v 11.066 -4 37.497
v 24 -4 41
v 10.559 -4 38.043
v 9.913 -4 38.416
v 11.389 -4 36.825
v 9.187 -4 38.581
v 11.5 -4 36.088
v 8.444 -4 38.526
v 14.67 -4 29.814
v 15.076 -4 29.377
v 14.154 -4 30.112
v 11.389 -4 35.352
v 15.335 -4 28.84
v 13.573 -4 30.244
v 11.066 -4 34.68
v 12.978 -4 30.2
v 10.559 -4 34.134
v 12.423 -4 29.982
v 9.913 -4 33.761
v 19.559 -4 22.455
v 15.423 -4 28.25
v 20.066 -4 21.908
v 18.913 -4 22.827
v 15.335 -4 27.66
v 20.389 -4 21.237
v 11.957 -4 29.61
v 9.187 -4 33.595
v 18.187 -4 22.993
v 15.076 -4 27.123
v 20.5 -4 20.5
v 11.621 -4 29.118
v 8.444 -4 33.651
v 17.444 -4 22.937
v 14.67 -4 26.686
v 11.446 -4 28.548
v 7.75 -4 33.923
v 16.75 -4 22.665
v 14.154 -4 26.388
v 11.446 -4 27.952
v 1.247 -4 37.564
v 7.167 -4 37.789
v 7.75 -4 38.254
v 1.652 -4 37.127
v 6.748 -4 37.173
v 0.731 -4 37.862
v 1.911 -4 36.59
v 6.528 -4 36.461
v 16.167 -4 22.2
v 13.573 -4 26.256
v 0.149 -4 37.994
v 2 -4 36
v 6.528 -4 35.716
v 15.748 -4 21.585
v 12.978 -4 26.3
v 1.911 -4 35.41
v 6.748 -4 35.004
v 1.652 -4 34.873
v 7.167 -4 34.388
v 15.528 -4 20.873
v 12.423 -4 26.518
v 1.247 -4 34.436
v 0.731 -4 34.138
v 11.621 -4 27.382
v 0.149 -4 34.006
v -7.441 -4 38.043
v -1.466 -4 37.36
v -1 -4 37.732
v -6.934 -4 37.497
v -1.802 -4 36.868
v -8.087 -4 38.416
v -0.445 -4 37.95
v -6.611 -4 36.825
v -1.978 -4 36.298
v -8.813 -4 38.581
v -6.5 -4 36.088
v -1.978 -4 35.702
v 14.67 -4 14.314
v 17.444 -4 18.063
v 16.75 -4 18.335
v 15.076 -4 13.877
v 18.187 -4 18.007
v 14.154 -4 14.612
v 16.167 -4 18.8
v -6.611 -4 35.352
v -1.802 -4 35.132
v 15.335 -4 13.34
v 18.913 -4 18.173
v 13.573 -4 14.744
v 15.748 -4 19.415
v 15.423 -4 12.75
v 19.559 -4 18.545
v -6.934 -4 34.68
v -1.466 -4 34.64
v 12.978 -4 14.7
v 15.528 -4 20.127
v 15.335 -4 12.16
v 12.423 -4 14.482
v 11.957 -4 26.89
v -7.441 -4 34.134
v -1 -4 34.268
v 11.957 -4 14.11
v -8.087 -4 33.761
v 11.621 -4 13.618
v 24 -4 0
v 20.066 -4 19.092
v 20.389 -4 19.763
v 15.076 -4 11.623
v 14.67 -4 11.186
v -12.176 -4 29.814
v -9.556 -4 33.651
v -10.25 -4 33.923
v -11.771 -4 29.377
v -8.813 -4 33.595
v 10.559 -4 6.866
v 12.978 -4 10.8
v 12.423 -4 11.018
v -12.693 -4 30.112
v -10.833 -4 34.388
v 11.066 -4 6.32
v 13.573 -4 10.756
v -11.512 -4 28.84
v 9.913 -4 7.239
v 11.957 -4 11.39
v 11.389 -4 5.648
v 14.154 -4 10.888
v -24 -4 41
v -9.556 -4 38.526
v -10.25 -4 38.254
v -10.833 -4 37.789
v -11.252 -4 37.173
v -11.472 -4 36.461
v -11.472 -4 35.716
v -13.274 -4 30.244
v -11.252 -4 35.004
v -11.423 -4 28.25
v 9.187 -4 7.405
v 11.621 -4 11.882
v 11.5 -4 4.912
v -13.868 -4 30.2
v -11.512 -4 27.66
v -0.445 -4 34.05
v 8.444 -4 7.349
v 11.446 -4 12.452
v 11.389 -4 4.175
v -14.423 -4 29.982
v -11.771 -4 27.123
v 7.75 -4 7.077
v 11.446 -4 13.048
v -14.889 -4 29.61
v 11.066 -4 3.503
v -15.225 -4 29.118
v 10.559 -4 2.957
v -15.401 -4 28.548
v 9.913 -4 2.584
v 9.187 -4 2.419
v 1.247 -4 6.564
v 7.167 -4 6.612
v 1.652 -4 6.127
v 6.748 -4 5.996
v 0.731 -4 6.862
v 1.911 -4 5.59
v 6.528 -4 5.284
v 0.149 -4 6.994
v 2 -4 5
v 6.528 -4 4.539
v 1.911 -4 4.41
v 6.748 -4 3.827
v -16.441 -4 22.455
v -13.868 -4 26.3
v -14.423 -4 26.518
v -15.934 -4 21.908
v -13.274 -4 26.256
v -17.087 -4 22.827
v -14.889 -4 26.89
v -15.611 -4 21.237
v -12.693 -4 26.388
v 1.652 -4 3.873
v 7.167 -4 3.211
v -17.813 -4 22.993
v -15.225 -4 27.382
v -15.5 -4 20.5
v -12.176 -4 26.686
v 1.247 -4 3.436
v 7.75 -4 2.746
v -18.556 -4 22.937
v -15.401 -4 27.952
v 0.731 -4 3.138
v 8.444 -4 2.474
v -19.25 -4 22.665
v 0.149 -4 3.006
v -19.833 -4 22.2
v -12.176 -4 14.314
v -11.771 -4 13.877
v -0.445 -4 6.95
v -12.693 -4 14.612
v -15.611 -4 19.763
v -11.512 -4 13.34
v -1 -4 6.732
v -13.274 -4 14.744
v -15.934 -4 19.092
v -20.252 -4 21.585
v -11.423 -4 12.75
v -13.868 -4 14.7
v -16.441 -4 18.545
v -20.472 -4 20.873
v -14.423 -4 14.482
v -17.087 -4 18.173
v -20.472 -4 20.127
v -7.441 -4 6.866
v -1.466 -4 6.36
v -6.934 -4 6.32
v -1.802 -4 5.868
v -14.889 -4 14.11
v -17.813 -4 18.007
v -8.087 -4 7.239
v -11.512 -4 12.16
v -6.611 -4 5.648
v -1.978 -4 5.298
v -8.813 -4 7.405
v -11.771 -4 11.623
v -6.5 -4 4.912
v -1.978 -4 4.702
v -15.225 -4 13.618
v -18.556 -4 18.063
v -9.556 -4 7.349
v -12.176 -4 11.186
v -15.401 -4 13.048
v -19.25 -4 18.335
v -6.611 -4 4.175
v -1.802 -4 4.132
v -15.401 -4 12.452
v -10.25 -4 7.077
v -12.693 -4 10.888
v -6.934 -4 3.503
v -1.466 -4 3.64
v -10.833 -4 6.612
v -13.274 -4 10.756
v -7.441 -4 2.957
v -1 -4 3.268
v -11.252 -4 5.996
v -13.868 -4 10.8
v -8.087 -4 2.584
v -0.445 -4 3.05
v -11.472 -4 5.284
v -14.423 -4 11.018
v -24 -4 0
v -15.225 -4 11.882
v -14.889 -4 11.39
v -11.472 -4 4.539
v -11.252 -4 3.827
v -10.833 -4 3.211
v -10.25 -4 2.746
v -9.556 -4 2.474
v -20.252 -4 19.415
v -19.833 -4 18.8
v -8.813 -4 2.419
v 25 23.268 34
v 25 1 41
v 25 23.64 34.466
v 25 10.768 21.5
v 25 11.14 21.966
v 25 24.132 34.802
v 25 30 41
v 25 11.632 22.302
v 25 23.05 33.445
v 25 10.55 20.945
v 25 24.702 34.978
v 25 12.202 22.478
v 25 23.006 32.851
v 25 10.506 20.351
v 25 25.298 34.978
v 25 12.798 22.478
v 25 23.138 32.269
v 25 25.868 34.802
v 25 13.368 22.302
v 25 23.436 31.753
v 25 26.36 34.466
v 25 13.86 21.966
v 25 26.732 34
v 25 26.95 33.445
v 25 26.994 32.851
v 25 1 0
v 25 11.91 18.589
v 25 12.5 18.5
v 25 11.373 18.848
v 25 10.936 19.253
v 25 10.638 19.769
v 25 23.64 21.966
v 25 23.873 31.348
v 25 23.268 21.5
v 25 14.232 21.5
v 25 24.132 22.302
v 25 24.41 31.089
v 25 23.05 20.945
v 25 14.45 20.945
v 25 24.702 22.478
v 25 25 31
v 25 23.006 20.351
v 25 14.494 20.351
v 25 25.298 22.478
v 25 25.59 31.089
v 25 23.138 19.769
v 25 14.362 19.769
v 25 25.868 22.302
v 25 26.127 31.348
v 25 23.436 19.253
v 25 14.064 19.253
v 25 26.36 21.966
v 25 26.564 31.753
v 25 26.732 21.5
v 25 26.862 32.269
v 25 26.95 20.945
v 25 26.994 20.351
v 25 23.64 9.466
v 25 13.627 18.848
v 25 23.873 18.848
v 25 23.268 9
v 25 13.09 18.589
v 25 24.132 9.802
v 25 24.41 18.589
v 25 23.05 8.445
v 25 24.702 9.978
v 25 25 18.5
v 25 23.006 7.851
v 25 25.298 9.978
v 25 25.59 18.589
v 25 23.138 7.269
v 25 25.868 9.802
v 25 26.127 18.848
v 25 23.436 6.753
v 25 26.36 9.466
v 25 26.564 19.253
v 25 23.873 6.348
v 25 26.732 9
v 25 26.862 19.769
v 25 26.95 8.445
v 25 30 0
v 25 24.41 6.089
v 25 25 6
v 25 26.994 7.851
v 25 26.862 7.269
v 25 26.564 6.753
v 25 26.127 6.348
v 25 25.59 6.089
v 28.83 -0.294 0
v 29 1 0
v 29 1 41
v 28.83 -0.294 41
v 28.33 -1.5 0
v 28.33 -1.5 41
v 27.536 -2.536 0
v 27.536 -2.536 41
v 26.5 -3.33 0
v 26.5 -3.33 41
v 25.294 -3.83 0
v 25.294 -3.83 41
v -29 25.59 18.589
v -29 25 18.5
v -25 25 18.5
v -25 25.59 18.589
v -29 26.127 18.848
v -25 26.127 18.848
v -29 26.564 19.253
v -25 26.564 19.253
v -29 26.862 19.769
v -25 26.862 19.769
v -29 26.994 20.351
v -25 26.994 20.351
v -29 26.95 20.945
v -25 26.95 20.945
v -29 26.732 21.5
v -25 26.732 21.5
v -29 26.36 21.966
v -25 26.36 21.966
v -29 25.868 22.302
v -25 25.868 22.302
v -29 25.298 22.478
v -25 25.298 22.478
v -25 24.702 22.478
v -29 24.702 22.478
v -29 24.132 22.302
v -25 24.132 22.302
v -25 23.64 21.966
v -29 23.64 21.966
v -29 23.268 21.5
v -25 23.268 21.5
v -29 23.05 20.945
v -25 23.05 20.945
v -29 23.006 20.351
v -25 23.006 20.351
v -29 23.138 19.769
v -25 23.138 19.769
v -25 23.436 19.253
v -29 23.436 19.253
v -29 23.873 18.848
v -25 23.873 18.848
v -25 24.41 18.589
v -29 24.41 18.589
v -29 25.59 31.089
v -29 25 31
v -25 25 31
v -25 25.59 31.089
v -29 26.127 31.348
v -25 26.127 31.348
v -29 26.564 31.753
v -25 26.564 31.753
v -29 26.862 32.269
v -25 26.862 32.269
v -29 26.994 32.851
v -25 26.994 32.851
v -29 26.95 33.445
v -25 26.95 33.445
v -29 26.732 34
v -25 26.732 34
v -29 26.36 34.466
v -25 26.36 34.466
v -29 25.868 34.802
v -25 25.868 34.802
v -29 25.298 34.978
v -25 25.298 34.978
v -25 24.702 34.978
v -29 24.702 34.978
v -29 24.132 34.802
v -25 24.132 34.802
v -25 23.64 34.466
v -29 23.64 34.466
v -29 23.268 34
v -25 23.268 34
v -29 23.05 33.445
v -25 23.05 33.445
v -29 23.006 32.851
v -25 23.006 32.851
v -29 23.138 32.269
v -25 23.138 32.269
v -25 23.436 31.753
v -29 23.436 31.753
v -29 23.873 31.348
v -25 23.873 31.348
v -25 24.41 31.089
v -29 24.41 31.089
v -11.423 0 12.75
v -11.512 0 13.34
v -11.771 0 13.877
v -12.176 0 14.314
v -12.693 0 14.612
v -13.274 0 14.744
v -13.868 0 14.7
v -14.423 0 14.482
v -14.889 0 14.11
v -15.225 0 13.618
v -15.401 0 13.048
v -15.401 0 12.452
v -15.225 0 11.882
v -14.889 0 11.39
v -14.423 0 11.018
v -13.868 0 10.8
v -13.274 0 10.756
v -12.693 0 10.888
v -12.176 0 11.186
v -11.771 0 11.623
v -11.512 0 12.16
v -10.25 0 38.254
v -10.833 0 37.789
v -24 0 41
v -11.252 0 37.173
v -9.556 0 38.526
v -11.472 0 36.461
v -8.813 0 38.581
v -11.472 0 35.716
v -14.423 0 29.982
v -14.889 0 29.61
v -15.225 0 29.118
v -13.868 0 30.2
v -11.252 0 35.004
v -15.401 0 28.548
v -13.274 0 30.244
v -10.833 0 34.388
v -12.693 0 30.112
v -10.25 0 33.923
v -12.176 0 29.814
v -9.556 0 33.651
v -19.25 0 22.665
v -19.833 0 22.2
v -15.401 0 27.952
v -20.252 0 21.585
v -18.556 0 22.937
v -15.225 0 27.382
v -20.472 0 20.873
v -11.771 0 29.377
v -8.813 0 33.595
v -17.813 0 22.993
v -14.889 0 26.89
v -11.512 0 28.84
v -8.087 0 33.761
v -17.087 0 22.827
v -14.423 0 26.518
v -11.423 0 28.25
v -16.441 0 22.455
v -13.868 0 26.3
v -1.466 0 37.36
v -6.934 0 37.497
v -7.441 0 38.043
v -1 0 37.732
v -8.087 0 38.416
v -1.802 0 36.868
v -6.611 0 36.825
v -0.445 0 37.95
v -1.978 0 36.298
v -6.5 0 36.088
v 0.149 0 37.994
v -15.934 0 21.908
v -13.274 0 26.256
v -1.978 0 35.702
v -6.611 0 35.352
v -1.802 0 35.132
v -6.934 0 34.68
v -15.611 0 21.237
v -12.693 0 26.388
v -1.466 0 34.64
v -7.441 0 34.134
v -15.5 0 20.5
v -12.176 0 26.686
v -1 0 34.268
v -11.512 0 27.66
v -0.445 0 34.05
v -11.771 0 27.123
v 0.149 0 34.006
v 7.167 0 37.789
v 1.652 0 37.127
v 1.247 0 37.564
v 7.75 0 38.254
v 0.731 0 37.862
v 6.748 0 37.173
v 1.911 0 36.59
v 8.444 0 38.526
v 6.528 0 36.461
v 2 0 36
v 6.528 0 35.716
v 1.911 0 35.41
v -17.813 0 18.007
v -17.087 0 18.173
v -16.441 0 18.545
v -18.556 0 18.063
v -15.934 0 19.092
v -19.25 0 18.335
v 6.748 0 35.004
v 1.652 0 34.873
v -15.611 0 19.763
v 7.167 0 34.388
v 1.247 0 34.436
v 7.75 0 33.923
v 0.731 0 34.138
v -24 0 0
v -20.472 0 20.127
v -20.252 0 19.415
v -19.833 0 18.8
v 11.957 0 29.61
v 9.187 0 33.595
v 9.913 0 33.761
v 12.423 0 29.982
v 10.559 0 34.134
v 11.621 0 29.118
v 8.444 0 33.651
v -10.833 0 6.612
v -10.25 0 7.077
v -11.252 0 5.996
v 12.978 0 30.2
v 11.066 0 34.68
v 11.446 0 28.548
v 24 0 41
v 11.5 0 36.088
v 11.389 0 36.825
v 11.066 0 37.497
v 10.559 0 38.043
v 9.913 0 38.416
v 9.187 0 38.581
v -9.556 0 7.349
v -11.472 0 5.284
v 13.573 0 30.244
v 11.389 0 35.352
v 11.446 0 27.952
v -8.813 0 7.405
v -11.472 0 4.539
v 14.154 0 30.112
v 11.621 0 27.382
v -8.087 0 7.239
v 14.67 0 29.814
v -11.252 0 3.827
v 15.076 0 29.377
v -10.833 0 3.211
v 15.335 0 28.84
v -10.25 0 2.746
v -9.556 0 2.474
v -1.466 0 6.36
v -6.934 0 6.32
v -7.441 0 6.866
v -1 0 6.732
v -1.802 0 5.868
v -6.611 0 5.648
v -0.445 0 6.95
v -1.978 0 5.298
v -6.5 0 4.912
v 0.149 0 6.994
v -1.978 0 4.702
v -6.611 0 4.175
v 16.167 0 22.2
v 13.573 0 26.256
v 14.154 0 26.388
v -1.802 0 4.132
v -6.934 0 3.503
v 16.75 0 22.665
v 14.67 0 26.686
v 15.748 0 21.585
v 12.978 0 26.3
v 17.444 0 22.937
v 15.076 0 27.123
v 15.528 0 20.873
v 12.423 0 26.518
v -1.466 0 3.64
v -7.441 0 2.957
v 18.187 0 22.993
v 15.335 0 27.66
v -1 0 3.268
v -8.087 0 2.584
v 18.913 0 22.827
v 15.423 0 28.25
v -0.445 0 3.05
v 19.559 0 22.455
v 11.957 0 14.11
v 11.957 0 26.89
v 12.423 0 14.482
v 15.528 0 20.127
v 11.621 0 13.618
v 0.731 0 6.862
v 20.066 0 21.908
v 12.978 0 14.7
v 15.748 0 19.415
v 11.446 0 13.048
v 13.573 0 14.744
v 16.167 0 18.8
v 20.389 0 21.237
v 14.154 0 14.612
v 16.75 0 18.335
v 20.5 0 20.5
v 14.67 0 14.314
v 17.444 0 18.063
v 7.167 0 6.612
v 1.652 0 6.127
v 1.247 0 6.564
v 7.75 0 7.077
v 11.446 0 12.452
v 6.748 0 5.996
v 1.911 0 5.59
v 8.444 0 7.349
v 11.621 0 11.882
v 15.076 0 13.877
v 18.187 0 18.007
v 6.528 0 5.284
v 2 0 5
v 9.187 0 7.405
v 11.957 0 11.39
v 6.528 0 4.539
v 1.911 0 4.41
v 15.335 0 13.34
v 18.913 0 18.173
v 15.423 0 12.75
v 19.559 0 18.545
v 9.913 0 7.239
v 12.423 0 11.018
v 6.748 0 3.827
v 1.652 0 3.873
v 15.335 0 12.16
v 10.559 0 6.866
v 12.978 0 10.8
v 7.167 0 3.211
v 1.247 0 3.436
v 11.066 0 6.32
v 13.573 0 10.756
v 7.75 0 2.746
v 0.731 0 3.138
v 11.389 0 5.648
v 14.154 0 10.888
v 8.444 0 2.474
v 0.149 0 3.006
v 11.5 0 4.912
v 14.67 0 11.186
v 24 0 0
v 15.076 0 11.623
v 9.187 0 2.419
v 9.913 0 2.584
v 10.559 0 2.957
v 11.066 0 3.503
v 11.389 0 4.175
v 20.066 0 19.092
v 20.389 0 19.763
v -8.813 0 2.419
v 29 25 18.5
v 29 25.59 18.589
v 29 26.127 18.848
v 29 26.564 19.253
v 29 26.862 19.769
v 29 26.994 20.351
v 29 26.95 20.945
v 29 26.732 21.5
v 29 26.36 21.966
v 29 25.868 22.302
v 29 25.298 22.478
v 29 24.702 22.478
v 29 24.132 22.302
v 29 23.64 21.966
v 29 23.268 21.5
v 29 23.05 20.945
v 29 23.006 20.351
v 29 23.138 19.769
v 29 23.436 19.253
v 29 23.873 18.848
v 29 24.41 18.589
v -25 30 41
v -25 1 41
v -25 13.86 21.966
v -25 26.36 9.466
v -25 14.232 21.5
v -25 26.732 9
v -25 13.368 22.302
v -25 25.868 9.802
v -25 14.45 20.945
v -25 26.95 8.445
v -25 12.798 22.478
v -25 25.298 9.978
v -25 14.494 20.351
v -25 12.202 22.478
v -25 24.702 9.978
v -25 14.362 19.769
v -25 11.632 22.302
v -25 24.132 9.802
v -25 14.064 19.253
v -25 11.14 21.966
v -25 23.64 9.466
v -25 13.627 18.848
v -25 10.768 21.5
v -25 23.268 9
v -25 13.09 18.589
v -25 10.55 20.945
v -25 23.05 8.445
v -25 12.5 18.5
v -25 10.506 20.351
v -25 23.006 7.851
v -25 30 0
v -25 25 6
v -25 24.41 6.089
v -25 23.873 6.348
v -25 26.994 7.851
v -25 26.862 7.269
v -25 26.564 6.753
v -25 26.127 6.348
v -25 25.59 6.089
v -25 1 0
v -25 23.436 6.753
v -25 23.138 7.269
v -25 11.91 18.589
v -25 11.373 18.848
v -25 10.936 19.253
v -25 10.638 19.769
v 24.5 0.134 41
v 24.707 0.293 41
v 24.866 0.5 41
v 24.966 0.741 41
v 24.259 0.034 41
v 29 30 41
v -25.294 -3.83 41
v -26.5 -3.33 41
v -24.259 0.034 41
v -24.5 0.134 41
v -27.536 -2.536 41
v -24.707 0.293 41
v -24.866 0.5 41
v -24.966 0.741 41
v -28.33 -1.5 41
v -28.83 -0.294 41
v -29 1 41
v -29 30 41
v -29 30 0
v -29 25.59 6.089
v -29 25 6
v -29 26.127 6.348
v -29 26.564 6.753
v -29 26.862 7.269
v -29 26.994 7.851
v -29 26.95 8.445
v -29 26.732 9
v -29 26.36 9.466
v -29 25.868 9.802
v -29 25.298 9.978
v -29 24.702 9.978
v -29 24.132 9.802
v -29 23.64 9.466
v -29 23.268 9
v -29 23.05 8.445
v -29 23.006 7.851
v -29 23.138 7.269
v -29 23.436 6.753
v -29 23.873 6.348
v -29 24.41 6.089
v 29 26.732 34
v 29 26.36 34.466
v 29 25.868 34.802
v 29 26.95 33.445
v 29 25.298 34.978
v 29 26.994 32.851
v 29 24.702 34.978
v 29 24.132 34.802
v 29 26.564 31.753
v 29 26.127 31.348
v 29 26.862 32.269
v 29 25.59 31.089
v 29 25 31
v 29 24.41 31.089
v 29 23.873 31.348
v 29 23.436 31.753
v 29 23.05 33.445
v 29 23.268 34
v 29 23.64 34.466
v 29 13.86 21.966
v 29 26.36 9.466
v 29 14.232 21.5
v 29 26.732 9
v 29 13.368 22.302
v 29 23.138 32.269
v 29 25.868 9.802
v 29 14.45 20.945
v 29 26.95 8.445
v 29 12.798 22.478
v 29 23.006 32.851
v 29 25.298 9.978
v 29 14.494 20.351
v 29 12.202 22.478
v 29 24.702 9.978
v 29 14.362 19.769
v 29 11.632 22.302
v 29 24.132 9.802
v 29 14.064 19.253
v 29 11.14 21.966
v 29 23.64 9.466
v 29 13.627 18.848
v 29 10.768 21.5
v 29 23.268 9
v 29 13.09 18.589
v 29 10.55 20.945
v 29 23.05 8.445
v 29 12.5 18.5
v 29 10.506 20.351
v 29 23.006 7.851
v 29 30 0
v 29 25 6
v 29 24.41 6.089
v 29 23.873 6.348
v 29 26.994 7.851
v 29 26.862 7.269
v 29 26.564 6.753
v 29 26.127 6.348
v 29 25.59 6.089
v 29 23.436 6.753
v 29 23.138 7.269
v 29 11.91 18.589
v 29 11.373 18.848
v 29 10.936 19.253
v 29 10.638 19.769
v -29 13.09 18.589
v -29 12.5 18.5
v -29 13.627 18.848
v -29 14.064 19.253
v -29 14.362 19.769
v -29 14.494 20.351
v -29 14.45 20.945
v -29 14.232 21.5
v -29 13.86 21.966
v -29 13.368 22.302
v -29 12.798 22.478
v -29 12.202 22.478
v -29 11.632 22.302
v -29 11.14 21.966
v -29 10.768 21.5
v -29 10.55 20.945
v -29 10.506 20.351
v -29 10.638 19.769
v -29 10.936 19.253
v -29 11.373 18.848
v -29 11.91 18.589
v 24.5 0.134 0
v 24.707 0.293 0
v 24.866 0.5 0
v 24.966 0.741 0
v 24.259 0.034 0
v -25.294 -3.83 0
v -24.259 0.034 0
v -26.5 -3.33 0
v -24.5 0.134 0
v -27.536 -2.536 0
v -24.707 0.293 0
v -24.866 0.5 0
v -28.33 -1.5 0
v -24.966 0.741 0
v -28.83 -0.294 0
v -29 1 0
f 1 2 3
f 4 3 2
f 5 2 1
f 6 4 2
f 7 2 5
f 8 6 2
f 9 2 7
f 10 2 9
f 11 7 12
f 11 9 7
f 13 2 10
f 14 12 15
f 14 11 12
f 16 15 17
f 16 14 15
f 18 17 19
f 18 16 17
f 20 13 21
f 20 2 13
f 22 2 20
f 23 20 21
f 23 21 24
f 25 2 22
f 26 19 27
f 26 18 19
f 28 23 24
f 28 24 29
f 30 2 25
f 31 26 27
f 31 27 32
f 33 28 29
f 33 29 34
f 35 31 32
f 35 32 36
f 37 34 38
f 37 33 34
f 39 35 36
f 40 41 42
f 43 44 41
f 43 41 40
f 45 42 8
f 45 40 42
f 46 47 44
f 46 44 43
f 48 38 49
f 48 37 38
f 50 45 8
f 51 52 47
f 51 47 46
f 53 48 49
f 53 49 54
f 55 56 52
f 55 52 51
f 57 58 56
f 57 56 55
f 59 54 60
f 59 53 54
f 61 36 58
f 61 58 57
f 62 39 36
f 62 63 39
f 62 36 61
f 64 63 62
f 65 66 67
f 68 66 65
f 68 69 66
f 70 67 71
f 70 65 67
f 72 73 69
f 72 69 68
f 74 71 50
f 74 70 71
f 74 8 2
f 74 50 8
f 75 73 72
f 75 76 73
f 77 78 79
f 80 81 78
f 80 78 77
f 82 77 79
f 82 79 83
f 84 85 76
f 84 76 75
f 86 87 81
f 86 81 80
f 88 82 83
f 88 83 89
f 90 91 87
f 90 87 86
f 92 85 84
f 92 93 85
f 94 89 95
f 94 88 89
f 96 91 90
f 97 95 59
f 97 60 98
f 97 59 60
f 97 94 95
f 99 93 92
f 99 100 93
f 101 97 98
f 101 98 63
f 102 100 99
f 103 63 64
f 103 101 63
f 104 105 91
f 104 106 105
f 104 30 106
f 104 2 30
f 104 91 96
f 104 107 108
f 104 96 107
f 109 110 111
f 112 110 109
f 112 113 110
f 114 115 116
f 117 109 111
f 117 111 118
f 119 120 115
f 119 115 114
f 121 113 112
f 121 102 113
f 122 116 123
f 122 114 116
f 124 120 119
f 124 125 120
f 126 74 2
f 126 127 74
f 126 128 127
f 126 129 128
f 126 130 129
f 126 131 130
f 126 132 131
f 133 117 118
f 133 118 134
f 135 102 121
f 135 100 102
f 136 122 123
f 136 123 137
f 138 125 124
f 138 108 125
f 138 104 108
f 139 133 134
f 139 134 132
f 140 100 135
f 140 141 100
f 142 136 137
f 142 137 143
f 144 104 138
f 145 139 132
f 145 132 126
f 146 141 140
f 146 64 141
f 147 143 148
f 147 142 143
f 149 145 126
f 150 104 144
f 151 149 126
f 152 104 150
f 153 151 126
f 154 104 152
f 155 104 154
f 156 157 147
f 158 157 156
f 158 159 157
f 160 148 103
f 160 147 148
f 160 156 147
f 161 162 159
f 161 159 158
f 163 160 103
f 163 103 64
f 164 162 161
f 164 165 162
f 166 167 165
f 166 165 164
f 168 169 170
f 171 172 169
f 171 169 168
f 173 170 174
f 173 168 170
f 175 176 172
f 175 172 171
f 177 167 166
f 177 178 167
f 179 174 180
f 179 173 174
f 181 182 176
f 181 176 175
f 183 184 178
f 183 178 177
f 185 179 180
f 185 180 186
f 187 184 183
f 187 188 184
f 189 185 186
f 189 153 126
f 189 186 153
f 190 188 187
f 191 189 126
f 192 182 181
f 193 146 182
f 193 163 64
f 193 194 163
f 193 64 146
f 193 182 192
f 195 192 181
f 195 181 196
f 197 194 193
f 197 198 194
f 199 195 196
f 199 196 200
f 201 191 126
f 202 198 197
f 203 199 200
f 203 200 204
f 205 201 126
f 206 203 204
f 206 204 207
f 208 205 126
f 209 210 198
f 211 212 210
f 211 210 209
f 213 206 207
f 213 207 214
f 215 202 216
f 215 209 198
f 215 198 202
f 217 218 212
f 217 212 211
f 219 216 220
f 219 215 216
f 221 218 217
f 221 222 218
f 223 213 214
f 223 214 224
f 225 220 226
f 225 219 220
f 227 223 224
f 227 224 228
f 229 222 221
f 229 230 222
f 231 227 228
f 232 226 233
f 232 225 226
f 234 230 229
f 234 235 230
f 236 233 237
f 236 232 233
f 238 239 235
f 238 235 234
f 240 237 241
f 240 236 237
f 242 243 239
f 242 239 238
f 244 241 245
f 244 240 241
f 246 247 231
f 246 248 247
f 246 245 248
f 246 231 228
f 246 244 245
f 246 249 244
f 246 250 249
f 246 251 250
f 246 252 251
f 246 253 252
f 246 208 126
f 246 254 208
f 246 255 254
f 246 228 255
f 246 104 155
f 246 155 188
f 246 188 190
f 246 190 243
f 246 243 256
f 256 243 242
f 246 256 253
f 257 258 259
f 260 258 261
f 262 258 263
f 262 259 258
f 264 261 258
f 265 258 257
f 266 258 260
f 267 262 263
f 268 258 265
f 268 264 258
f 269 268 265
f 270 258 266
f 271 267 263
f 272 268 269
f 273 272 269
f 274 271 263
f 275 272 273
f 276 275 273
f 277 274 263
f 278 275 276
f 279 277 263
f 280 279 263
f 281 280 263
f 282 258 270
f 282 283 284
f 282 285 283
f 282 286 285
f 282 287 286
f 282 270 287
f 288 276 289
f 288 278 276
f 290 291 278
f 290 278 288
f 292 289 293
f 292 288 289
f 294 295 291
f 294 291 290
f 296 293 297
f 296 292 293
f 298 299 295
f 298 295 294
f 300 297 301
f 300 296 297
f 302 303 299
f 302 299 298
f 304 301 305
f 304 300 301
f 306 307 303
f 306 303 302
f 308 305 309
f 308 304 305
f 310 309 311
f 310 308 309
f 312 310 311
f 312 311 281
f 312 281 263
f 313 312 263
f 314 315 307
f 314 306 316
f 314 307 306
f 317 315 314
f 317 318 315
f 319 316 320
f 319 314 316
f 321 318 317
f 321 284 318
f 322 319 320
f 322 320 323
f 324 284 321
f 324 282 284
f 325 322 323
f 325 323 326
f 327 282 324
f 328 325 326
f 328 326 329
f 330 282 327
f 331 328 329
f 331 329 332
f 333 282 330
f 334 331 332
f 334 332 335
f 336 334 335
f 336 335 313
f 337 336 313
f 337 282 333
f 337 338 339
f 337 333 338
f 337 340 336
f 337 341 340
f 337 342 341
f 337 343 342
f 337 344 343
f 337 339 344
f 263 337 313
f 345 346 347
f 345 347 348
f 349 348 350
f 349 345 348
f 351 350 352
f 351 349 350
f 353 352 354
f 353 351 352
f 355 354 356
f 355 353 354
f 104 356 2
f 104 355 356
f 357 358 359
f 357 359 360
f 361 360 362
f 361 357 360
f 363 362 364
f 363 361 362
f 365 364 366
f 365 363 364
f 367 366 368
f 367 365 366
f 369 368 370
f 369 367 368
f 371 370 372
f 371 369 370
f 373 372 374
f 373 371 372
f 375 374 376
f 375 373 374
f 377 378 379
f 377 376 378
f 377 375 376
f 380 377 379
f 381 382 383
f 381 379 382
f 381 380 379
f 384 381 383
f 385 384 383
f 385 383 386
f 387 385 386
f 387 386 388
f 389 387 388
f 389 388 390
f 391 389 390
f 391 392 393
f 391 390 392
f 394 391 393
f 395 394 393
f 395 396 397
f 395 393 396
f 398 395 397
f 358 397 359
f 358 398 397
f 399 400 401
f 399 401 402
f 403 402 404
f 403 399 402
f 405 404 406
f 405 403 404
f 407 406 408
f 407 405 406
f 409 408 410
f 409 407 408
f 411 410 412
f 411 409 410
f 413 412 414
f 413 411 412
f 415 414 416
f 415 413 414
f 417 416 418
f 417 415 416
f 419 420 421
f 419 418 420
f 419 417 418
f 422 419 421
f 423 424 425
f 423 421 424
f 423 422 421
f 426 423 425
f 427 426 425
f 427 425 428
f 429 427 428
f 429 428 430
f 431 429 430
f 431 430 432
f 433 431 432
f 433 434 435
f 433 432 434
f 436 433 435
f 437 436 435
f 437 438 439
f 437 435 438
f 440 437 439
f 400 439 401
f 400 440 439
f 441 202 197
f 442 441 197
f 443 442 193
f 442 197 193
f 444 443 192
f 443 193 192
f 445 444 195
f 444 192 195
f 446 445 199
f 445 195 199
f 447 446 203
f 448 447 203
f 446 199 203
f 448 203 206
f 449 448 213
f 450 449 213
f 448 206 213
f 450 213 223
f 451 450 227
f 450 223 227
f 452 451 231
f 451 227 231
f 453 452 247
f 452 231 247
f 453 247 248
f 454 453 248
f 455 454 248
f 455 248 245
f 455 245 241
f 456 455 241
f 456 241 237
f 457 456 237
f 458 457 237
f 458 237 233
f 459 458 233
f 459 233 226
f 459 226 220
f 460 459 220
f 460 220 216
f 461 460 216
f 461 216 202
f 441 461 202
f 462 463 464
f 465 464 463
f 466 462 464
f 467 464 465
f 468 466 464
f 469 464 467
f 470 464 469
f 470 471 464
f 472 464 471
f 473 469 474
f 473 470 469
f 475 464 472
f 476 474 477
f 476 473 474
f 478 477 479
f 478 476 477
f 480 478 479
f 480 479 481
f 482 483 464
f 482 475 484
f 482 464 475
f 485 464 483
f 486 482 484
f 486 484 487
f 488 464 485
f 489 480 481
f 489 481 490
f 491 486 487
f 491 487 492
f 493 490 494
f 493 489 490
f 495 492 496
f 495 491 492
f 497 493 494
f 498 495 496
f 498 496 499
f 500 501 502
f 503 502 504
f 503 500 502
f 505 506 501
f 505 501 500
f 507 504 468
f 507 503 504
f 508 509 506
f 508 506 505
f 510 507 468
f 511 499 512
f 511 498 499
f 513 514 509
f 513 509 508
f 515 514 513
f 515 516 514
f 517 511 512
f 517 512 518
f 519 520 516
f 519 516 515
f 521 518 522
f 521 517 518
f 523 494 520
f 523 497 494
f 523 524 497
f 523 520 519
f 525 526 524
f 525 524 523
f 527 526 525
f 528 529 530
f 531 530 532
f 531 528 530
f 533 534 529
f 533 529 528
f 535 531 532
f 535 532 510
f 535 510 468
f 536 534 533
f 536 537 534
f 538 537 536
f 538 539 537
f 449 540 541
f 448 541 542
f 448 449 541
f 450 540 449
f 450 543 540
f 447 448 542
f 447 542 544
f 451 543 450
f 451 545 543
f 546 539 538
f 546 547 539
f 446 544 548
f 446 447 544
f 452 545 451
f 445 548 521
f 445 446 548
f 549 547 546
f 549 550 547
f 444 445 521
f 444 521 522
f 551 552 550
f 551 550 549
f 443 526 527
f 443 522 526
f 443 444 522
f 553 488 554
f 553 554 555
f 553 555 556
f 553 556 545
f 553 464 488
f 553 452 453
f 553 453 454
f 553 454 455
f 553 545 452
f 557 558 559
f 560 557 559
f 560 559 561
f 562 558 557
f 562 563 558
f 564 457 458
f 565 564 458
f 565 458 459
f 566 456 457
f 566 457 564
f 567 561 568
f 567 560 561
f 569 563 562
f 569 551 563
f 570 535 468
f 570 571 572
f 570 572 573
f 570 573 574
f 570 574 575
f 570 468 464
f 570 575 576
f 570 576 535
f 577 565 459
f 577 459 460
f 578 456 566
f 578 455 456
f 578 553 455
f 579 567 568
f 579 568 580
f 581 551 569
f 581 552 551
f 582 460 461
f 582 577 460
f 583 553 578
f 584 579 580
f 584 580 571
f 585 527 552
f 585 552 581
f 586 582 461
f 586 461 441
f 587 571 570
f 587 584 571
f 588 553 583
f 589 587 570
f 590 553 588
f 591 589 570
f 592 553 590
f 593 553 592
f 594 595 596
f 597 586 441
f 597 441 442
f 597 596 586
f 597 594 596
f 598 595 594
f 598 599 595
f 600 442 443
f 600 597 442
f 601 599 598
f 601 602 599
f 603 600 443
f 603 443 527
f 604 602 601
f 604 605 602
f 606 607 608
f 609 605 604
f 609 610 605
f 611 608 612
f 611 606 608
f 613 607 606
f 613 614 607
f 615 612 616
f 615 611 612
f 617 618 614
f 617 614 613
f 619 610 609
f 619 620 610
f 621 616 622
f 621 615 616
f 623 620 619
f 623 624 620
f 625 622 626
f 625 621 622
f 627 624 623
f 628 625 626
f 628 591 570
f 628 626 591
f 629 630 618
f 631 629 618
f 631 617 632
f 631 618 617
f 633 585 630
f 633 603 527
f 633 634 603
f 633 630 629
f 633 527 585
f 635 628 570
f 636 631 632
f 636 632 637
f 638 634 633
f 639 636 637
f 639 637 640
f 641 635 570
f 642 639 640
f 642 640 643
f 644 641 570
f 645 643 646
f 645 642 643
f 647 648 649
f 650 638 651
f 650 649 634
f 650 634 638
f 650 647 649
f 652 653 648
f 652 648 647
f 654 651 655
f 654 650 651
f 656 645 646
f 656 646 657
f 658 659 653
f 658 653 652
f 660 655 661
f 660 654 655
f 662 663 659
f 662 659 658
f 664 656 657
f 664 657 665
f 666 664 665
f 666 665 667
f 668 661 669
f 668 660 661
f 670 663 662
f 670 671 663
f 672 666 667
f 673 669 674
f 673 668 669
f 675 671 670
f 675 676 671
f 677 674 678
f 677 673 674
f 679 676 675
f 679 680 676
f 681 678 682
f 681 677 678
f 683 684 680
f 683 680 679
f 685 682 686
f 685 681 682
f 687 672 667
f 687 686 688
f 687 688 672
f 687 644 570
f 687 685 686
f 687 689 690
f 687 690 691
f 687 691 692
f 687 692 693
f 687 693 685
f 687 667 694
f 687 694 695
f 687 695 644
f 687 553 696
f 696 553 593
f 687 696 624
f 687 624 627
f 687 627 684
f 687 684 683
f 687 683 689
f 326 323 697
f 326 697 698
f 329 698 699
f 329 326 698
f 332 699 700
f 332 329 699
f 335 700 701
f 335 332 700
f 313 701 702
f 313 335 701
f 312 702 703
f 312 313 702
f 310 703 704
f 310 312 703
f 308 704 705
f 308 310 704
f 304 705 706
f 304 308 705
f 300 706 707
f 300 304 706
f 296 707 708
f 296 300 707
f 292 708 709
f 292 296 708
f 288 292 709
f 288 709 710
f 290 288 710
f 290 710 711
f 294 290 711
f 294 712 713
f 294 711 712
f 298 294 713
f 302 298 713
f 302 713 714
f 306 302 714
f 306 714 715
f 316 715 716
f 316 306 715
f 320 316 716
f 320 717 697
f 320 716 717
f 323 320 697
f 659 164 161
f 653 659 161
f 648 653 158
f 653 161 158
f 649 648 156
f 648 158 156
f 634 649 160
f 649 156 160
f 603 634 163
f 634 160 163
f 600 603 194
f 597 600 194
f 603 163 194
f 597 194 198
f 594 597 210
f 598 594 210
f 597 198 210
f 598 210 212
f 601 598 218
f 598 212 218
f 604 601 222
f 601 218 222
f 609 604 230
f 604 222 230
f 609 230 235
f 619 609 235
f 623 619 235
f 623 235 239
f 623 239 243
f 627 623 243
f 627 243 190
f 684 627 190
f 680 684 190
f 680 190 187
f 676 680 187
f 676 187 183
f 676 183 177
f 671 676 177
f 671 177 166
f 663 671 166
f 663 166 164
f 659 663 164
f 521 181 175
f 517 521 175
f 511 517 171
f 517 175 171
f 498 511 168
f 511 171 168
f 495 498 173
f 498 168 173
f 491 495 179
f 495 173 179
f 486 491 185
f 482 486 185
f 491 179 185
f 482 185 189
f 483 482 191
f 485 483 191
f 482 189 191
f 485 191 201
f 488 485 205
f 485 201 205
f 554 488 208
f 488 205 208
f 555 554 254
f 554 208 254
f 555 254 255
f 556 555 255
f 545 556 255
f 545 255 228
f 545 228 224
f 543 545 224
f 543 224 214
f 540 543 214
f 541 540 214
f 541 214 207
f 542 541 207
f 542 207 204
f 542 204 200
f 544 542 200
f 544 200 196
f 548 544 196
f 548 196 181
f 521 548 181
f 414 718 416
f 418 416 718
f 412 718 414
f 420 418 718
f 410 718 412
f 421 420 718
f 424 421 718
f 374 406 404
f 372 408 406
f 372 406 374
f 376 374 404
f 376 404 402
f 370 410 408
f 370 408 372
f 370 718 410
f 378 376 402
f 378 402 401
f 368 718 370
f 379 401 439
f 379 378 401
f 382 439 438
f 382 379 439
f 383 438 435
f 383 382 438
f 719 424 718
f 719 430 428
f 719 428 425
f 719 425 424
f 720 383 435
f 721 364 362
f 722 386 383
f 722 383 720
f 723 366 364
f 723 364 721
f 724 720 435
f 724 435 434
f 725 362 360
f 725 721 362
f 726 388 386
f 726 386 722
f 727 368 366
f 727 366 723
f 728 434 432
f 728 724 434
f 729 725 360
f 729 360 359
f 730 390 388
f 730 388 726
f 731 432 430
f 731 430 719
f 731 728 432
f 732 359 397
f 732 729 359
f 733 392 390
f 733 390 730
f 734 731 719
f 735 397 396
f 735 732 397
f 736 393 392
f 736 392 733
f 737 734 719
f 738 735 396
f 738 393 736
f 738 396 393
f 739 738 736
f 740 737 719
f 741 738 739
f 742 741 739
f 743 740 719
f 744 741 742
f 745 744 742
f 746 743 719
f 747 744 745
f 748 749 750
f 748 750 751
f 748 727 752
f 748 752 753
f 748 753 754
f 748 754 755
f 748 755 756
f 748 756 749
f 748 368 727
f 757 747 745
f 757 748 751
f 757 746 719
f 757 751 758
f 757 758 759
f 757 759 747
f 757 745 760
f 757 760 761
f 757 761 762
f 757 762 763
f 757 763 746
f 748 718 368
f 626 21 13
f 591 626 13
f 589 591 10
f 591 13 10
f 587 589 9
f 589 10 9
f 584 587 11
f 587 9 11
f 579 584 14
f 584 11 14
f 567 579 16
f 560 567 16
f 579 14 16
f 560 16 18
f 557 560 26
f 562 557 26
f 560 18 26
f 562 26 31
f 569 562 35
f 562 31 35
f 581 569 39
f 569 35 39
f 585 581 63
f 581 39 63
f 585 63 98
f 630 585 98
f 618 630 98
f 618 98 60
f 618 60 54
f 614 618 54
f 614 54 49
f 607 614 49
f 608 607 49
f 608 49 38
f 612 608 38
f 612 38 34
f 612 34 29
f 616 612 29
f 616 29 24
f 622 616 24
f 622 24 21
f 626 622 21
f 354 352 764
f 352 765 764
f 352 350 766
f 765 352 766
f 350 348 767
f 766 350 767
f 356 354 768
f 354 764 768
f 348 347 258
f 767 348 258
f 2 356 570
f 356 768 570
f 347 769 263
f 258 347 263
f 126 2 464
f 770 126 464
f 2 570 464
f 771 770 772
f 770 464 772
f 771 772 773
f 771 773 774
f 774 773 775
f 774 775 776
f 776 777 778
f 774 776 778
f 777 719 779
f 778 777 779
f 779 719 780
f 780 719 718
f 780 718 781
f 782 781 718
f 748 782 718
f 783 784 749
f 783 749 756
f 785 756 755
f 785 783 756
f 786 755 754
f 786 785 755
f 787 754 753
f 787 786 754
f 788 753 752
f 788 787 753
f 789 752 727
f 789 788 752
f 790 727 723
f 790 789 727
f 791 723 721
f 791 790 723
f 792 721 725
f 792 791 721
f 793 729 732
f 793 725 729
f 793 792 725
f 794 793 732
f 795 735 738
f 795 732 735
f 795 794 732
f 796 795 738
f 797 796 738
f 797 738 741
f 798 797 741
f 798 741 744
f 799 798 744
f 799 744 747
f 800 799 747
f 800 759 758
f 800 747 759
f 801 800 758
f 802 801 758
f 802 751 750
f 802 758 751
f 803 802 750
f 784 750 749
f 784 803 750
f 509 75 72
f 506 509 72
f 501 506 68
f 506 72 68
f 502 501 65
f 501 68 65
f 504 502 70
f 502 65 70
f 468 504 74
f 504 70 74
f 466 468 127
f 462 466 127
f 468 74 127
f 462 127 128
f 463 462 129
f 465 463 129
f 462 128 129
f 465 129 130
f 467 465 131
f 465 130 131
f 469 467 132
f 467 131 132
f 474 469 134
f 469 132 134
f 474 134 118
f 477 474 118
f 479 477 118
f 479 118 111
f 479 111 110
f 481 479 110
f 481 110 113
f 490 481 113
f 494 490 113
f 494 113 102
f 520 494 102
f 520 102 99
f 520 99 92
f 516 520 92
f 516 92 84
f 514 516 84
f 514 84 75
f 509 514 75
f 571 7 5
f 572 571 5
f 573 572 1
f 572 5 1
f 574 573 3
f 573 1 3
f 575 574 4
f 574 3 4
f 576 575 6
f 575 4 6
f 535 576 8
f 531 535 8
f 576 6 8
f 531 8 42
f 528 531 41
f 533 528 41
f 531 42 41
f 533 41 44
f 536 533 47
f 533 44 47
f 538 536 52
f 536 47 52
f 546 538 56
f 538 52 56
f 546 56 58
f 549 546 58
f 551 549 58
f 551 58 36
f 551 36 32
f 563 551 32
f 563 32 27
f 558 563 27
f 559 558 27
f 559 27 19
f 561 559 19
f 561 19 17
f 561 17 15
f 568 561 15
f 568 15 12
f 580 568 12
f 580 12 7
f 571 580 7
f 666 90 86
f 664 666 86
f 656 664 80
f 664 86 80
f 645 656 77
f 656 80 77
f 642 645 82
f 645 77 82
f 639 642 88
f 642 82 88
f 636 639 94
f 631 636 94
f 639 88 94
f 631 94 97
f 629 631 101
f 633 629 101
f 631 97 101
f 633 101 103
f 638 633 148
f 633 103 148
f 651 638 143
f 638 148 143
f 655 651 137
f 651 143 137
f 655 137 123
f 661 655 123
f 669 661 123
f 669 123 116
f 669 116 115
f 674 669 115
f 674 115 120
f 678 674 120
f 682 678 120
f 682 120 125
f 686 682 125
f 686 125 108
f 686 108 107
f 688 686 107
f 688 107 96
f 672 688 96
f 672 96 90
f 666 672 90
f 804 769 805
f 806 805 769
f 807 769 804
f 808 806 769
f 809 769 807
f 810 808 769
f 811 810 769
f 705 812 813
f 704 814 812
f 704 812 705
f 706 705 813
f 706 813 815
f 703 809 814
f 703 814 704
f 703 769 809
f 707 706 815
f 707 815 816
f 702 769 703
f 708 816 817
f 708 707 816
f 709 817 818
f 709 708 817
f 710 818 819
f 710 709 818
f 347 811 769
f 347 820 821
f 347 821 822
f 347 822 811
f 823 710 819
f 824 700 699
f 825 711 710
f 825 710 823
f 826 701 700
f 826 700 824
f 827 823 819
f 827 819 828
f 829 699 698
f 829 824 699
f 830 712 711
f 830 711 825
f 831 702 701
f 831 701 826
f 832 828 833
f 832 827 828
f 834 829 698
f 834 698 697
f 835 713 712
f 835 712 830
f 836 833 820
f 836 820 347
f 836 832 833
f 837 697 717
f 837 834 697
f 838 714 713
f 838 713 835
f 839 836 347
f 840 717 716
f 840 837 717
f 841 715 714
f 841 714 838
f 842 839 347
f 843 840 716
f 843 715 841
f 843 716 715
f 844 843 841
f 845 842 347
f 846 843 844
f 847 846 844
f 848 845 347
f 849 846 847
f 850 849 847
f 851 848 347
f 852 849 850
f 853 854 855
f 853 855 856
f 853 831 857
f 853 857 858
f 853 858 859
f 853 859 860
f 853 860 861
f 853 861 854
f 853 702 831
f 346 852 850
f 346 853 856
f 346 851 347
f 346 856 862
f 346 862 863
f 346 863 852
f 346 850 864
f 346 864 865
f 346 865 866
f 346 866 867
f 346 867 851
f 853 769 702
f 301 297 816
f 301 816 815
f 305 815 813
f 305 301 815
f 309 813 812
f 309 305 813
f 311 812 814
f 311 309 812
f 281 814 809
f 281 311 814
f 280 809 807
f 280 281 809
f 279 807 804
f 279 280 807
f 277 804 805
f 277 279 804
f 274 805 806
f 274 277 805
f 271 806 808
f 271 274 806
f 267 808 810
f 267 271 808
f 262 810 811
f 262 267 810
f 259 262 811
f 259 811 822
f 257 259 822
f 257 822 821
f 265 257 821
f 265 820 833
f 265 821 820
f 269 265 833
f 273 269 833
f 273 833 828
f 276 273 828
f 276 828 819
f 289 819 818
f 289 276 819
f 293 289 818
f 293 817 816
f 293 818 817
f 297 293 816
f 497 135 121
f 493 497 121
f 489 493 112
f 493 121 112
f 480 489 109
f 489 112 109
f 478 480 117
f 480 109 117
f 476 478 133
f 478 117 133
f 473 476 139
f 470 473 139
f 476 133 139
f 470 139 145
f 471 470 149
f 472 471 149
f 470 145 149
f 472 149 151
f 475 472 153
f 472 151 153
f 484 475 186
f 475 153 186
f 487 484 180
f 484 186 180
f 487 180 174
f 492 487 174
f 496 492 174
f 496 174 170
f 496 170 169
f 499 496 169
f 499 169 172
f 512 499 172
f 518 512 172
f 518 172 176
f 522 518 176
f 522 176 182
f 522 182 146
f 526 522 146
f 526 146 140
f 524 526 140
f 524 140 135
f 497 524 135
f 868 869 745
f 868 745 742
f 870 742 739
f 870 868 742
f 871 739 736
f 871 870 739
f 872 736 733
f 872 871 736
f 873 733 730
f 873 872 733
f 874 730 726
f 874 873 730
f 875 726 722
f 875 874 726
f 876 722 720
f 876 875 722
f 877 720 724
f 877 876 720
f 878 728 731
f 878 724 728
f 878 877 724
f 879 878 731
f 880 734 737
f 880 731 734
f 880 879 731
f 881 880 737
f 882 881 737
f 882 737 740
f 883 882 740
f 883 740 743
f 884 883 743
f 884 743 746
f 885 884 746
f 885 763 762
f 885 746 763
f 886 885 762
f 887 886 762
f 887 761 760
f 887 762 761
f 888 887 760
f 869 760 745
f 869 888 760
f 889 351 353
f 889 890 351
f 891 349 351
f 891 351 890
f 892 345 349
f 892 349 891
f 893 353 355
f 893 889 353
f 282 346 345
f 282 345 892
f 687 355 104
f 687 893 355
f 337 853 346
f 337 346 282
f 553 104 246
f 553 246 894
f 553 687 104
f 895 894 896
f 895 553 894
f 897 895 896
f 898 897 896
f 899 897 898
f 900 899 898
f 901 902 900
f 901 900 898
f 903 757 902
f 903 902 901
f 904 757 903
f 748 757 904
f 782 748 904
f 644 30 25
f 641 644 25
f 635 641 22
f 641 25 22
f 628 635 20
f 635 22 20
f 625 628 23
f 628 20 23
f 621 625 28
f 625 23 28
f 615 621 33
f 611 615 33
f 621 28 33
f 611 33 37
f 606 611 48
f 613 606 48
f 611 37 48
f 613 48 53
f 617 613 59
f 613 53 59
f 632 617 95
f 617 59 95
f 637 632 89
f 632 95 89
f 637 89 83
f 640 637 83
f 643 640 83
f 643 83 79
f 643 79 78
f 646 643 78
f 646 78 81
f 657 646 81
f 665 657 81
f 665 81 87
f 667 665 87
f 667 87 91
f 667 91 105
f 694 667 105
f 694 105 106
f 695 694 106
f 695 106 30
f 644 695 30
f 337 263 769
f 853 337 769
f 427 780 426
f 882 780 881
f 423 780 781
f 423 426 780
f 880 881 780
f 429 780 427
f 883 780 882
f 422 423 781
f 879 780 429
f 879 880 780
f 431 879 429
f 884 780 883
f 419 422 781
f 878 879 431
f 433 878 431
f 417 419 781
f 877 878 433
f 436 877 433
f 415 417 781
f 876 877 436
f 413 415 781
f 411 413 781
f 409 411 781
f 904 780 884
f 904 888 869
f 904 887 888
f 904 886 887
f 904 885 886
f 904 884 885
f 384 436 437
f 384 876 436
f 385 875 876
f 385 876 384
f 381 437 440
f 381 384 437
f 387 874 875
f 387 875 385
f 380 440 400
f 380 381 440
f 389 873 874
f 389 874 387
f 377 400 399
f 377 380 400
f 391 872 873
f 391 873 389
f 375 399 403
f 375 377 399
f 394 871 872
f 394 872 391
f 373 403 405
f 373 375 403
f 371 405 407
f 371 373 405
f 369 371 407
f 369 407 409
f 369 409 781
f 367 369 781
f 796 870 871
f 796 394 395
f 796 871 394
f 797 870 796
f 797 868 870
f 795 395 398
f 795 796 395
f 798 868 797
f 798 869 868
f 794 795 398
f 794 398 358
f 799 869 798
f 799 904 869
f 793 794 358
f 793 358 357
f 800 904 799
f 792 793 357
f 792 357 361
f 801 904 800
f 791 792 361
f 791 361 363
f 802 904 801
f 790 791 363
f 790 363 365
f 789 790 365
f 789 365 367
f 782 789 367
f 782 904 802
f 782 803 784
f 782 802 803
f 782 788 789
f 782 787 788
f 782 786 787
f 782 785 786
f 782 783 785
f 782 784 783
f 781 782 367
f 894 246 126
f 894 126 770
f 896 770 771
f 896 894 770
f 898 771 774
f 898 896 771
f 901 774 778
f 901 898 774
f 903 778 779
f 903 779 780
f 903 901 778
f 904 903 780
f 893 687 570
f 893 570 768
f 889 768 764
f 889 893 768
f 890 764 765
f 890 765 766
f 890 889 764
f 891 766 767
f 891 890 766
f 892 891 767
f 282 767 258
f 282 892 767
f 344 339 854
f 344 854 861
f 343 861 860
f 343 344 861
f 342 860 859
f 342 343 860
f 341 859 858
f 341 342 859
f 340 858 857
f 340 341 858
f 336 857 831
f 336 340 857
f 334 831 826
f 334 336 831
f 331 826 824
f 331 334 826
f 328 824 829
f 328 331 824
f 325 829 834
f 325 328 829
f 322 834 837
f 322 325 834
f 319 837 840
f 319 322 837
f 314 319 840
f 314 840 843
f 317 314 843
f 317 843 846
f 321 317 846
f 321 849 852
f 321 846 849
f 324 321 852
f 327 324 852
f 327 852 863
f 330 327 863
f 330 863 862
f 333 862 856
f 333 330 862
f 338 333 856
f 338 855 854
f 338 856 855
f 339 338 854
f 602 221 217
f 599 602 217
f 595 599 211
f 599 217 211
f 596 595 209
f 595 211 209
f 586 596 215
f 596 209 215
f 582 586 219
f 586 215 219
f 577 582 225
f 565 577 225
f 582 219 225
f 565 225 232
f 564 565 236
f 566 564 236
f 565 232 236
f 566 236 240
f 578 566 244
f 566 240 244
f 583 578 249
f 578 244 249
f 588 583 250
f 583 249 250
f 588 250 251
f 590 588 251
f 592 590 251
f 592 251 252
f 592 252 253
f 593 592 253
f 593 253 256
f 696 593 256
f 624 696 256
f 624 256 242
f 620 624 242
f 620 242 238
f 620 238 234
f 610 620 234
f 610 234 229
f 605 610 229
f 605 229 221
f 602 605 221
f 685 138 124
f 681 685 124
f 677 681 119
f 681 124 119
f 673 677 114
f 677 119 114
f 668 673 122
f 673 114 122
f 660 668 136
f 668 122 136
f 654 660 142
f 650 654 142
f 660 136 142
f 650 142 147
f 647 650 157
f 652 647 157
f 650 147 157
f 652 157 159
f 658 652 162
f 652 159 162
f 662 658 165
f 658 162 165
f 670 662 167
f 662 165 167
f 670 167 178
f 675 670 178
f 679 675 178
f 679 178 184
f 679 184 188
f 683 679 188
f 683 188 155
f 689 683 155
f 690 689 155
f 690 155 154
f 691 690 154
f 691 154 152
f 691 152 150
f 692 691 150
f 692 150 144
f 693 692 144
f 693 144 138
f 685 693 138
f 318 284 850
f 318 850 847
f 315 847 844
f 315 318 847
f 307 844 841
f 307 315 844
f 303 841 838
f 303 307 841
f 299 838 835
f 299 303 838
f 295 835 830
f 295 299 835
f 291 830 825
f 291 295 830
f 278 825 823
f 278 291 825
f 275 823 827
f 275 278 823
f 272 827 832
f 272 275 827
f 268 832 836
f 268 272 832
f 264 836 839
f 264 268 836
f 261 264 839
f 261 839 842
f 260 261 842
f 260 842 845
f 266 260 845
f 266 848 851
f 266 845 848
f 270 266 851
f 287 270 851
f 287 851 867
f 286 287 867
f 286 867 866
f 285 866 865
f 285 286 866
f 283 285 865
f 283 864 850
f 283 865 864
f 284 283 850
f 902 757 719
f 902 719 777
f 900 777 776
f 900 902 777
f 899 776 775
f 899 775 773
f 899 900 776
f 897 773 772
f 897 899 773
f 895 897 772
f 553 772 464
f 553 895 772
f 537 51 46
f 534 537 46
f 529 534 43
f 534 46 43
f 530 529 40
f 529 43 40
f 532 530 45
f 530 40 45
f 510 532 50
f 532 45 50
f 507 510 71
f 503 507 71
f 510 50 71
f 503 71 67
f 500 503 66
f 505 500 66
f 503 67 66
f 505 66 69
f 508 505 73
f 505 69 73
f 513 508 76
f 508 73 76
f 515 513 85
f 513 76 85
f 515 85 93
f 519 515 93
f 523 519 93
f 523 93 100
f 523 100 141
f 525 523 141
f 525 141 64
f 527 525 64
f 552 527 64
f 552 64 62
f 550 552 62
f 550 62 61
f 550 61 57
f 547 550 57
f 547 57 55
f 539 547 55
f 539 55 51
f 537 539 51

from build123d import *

# Parameters (mm, degrees)
SM_BASE_FLANGE_1_DEPTH   = 41
SKETCH_9_R               = 2.5
SKETCH_9_R_2             = 2
CUT_EXTRUDE_4_DEPTH      = 61.6465168
CUT_EXTRUDE_5_DEPTH      = 78.103826105
CUT_EXTRUDE_5_DEPTH_BACK = 78.103826105
SKETCH_10_R              = 2


# Sheet-metal steps are written as plain solids
with BuildPart() as part:
    # Sketch 1 → Базовая кромка1 (new body)
    with BuildSketch(Plane.XY):
        with BuildLine():
            Line((-25, 30), (-25, 1))
            ThreePointArc((-25, 1), (-24.707106781, 0.292893219), (-24, 0))
            Line((-24, 0), (24, 0))
            ThreePointArc((24, 0), (24.707106781, 0.292893219), (25, 1))
            Line((25, 1), (25, 30))
            Line((25, 30), (29, 30))
            Line((29, 30), (29, 1))
            ThreePointArc((29, 1), (27.535533906, -2.535533906), (24, -4))
            Line((24, -4), (-24, -4))
            ThreePointArc((-24, -4), (-27.535533906, -2.535533906), (-29, 1))
            Line((-29, 1), (-29, 30))
            Line((-29, 30), (-25, 30))
        make_face()
    extrude(amount=SM_BASE_FLANGE_1_DEPTH)

    # Эскиз9 → Вырез-Вытянуть4 (cut, through all)
    with BuildSketch(Plane.XZ.offset(4)):
        with Locations((-18, 20.5)):
            Circle(SKETCH_9_R)
        with Locations((-9, 36.088457268)):
            Circle(SKETCH_9_R)
        with Locations((9, 36.088457268)):
            Circle(SKETCH_9_R)
        with Locations((18, 20.5)):
            Circle(SKETCH_9_R)
        with Locations((9, 4.911542732)):
            Circle(SKETCH_9_R)
        with Locations((-9, 4.911542732)):
            Circle(SKETCH_9_R)
        with Locations((0, 5)):
            Circle(SKETCH_9_R_2)
        with Locations((-13.423393759, 12.75)):
            Circle(SKETCH_9_R_2)
        with Locations((-13.423393759, 28.25)):
            Circle(SKETCH_9_R_2)
        with Locations((0, 36)):
            Circle(SKETCH_9_R_2)
        with Locations((13.423393759, 28.25)):
            Circle(SKETCH_9_R_2)
        with Locations((13.423393759, 12.75)):
            Circle(SKETCH_9_R_2)
    extrude(amount=-CUT_EXTRUDE_4_DEPTH, mode=Mode.SUBTRACT)

    # Эскиз10 → Вырез-Вытянуть5 (cut, two sides: drawn at the far end of the back side and taken through both)
    with BuildSketch(Plane(origin=(29, 0, 0), x_dir=(0, 0, -1), z_dir=(1, 0, 0)).offset(-CUT_EXTRUDE_5_DEPTH_BACK)):
        with Locations((-33, 25)):
            Circle(SKETCH_10_R)
        with Locations((-20.5, 25)):
            Circle(SKETCH_10_R)
        with Locations((-8, 25)):
            Circle(SKETCH_10_R)
        with Locations((-20.5, 12.5)):
            Circle(SKETCH_10_R)
    extrude(amount=CUT_EXTRUDE_5_DEPTH + CUT_EXTRUDE_5_DEPTH_BACK, mode=Mode.SUBTRACT)


solid = part.part
